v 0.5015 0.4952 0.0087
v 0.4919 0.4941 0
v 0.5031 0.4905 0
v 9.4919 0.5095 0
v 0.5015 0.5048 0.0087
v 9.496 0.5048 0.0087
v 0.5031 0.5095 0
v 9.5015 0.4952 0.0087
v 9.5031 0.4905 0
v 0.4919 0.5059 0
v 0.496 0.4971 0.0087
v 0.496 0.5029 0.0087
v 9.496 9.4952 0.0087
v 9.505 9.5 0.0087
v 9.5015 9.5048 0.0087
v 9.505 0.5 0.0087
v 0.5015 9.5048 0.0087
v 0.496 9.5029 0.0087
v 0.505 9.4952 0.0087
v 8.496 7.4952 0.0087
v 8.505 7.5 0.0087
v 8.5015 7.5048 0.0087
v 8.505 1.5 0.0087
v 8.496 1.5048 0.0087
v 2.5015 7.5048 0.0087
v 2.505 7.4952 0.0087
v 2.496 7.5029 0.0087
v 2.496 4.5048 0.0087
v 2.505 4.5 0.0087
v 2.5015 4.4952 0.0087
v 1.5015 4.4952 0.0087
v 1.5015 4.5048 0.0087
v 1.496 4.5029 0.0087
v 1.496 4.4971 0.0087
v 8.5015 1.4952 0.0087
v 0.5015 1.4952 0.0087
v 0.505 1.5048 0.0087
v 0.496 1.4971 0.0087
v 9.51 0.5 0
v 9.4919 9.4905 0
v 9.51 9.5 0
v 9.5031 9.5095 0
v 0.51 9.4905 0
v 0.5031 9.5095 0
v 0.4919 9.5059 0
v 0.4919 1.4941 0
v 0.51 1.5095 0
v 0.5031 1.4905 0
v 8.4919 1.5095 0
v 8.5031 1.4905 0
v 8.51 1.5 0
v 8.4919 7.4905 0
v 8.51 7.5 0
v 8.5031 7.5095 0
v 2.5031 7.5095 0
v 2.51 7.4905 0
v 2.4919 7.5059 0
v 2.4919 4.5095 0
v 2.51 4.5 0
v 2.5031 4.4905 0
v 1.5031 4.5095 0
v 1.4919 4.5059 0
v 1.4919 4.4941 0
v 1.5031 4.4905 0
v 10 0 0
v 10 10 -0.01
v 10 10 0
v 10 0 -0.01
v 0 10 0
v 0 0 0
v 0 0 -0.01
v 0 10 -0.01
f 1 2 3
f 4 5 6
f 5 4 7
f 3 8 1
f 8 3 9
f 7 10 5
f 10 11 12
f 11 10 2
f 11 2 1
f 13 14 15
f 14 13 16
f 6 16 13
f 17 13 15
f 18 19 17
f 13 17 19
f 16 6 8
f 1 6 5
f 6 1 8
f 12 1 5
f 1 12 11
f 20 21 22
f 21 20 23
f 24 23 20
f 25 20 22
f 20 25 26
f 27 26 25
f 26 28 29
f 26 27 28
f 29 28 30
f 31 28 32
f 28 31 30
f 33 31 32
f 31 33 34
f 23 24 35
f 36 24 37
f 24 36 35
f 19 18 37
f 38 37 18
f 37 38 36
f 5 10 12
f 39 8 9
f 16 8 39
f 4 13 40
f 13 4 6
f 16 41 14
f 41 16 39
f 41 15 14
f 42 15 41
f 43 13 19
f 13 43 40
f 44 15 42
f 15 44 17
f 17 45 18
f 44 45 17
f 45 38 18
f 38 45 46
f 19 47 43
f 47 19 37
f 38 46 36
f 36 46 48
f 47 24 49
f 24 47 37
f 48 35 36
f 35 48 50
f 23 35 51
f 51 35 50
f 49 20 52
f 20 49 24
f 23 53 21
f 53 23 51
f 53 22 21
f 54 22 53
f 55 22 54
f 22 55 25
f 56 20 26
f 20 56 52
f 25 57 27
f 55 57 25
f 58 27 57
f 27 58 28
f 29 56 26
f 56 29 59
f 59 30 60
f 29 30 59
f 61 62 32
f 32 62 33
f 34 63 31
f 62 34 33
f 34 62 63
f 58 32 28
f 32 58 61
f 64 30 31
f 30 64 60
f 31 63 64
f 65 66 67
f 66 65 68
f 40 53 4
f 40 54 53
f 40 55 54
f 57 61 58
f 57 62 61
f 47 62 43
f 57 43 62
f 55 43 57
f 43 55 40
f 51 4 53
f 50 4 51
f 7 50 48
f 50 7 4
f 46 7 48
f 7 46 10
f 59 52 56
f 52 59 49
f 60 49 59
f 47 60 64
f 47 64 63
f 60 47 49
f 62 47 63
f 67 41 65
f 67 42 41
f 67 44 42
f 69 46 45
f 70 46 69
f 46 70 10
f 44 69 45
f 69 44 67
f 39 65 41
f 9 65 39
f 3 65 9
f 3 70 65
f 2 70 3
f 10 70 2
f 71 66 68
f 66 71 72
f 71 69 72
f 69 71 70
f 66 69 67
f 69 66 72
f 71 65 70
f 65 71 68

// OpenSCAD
hull(){
    translate([0.5, 0.5]) sphere(0.01);
    translate([1.5, 0.5]) sphere(0.01);
}
hull(){
    translate([1.5, 0.5]) sphere(0.01);
    translate([2.5, 0.5]) sphere(0.01);
}
hull(){
    translate([2.5, 0.5]) sphere(0.01);
    translate([3.5, 0.5]) sphere(0.01);
}
hull(){
    translate([3.5, 0.5]) sphere(0.01);
    translate([4.5, 0.5]) sphere(0.01);
}
hull(){
    translate([4.5, 0.5]) sphere(0.01);
    translate([5.5, 0.5]) sphere(0.01);
}
hull(){
    translate([5.5, 0.5]) sphere(0.01);
    translate([6.5, 0.5]) sphere(0.01);
}
hull(){
    translate([6.5, 0.5]) sphere(0.01);
    translate([7.5, 0.5]) sphere(0.01);
}
hull(){
    translate([7.5, 0.5]) sphere(0.01);
    translate([8.5, 0.5]) sphere(0.01);
}
hull(){
    translate([8.5, 0.5]) sphere(0.01);
    translate([9.5, 0.5]) sphere(0.01);
}
hull(){
    translate([9.5, 0.5]) sphere(0.01);
    translate([9.5, 1.5]) sphere(0.01);
}
hull(){
    translate([9.5, 1.5]) sphere(0.01);
    translate([9.5, 2.5]) sphere(0.01);
}
hull(){
    translate([9.5, 2.5]) sphere(0.01);
    translate([9.5, 3.5]) sphere(0.01);
}
hull(){
    translate([9.5, 3.5]) sphere(0.01);
    translate([9.5, 4.5]) sphere(0.01);
}
hull(){
    translate([9.5, 4.5]) sphere(0.01);
    translate([9.5, 5.5]) sphere(0.01);
}
hull(){
    translate([9.5, 5.5]) sphere(0.01);
    translate([9.5, 6.5]) sphere(0.01);
}
hull(){
    translate([9.5, 6.5]) sphere(0.01);
    translate([9.5, 7.5]) sphere(0.01);
}
hull(){
    translate([9.5, 7.5]) sphere(0.01);
    translate([9.5, 8.5]) sphere(0.01);
}
hull(){
    translate([9.5, 8.5]) sphere(0.01);
    translate([9.5, 9.5]) sphere(0.01);
}
hull(){
    translate([9.5, 9.5]) sphere(0.01);
    translate([8.5, 9.5]) sphere(0.01);
}
hull(){
    translate([8.5, 9.5]) sphere(0.01);
    translate([7.5, 9.5]) sphere(0.01);
}
hull(){
    translate([7.5, 9.5]) sphere(0.01);
    translate([6.5, 9.5]) sphere(0.01);
}
hull(){
    translate([6.5, 9.5]) sphere(0.01);
    translate([5.5, 9.5]) sphere(0.01);
}
hull(){
    translate([5.5, 9.5]) sphere(0.01);
    translate([4.5, 9.5]) sphere(0.01);
}
hull(){
    translate([4.5, 9.5]) sphere(0.01);
    translate([3.5, 9.5]) sphere(0.01);
}
hull(){
    translate([3.5, 9.5]) sphere(0.01);
    translate([2.5, 9.5]) sphere(0.01);
}
hull(){
    translate([2.5, 9.5]) sphere(0.01);
    translate([1.5, 9.5]) sphere(0.01);
}
hull(){
    translate([1.5, 9.5]) sphere(0.01);
    translate([0.5, 9.5]) sphere(0.01);
}
hull(){
    translate([0.5, 9.5]) sphere(0.01);
    translate([0.5, 8.5]) sphere(0.01);
}
hull(){
    translate([0.5, 8.5]) sphere(0.01);
    translate([0.5, 7.5]) sphere(0.01);
}
hull(){
    translate([0.5, 7.5]) sphere(0.01);
    translate([0.5, 6.5]) sphere(0.01);
}
hull(){
    translate([0.5, 6.5]) sphere(0.01);
    translate([0.5, 5.5]) sphere(0.01);
}
hull(){
    translate([0.5, 5.5]) sphere(0.01);
    translate([0.5, 4.5]) sphere(0.01);
}
hull(){
    translate([0.5, 4.5]) sphere(0.01);
    translate([0.5, 3.5]) sphere(0.01);
}
hull(){
    translate([0.5, 3.5]) sphere(0.01);
    translate([0.5, 2.5]) sphere(0.01);
}
hull(){
    translate([0.5, 2.5]) sphere(0.01);
    translate([0.5, 1.5]) sphere(0.01);
}
hull(){
    translate([0.5, 1.5]) sphere(0.01);
    translate([1.5, 1.5]) sphere(0.01);
}
hull(){
    translate([1.5, 1.5]) sphere(0.01);
    translate([2.5, 1.5]) sphere(0.01);
}
hull(){
    translate([2.5, 1.5]) sphere(0.01);
    translate([3.5, 1.5]) sphere(0.01);
}
hull(){
    translate([3.5, 1.5]) sphere(0.01);
    translate([4.5, 1.5]) sphere(0.01);
}
hull(){
    translate([4.5, 1.5]) sphere(0.01);
    translate([5.5, 1.5]) sphere(0.01);
}
hull(){
    translate([5.5, 1.5]) sphere(0.01);
    translate([6.5, 1.5]) sphere(0.01);
}
hull(){
    translate([6.5, 1.5]) sphere(0.01);
    translate([7.5, 1.5]) sphere(0.01);
}
hull(){
    translate([7.5, 1.5]) sphere(0.01);
    translate([8.5, 1.5]) sphere(0.01);
}
hull(){
    translate([8.5, 1.5]) sphere(0.01);
    translate([8.5, 2.5]) sphere(0.01);
}
hull(){
    translate([8.5, 2.5]) sphere(0.01);
    translate([8.5, 3.5]) sphere(0.01);
}
hull(){
    translate([8.5, 3.5]) sphere(0.01);
    translate([8.5, 4.5]) sphere(0.01);
}
hull(){
    translate([8.5, 4.5]) sphere(0.01);
    translate([8.5, 5.5]) sphere(0.01);
}
hull(){
    translate([8.5, 5.5]) sphere(0.01);
    translate([8.5, 6.5]) sphere(0.01);
}
hull(){
    translate([8.5, 6.5]) sphere(0.01);
    translate([8.5, 7.5]) sphere(0.01);
}
hull(){
    translate([8.5, 7.5]) sphere(0.01);
    translate([7.5, 7.5]) sphere(0.01);
}
hull(){
    translate([7.5, 7.5]) sphere(0.01);
    translate([6.5, 7.5]) sphere(0.01);
}
hull(){
    translate([6.5, 7.5]) sphere(0.01);
    translate([5.5, 7.5]) sphere(0.01);
}
hull(){
    translate([5.5, 7.5]) sphere(0.01);
    translate([4.5, 7.5]) sphere(0.01);
}
hull(){
    translate([4.5, 7.5]) sphere(0.01);
    translate([3.5, 7.5]) sphere(0.01);
}
hull(){
    translate([3.5, 7.5]) sphere(0.01);
    translate([2.5, 7.5]) sphere(0.01);
}
hull(){
    translate([2.5, 7.5]) sphere(0.01);
    translate([2.5, 6.5]) sphere(0.01);
}
hull(){
    translate([2.5, 6.5]) sphere(0.01);
    translate([2.5, 5.5]) sphere(0.01);
}
hull(){
    translate([2.5, 5.5]) sphere(0.01);
    translate([2.5, 4.5]) sphere(0.01);
}
hull(){
    translate([2.5, 4.5]) sphere(0.01);
    translate([1.5, 4.5]) sphere(0.01);
}
translate([0,0,-0.01]) color([0.1,0.1,0.1]) cube([10,10,0.01]);
